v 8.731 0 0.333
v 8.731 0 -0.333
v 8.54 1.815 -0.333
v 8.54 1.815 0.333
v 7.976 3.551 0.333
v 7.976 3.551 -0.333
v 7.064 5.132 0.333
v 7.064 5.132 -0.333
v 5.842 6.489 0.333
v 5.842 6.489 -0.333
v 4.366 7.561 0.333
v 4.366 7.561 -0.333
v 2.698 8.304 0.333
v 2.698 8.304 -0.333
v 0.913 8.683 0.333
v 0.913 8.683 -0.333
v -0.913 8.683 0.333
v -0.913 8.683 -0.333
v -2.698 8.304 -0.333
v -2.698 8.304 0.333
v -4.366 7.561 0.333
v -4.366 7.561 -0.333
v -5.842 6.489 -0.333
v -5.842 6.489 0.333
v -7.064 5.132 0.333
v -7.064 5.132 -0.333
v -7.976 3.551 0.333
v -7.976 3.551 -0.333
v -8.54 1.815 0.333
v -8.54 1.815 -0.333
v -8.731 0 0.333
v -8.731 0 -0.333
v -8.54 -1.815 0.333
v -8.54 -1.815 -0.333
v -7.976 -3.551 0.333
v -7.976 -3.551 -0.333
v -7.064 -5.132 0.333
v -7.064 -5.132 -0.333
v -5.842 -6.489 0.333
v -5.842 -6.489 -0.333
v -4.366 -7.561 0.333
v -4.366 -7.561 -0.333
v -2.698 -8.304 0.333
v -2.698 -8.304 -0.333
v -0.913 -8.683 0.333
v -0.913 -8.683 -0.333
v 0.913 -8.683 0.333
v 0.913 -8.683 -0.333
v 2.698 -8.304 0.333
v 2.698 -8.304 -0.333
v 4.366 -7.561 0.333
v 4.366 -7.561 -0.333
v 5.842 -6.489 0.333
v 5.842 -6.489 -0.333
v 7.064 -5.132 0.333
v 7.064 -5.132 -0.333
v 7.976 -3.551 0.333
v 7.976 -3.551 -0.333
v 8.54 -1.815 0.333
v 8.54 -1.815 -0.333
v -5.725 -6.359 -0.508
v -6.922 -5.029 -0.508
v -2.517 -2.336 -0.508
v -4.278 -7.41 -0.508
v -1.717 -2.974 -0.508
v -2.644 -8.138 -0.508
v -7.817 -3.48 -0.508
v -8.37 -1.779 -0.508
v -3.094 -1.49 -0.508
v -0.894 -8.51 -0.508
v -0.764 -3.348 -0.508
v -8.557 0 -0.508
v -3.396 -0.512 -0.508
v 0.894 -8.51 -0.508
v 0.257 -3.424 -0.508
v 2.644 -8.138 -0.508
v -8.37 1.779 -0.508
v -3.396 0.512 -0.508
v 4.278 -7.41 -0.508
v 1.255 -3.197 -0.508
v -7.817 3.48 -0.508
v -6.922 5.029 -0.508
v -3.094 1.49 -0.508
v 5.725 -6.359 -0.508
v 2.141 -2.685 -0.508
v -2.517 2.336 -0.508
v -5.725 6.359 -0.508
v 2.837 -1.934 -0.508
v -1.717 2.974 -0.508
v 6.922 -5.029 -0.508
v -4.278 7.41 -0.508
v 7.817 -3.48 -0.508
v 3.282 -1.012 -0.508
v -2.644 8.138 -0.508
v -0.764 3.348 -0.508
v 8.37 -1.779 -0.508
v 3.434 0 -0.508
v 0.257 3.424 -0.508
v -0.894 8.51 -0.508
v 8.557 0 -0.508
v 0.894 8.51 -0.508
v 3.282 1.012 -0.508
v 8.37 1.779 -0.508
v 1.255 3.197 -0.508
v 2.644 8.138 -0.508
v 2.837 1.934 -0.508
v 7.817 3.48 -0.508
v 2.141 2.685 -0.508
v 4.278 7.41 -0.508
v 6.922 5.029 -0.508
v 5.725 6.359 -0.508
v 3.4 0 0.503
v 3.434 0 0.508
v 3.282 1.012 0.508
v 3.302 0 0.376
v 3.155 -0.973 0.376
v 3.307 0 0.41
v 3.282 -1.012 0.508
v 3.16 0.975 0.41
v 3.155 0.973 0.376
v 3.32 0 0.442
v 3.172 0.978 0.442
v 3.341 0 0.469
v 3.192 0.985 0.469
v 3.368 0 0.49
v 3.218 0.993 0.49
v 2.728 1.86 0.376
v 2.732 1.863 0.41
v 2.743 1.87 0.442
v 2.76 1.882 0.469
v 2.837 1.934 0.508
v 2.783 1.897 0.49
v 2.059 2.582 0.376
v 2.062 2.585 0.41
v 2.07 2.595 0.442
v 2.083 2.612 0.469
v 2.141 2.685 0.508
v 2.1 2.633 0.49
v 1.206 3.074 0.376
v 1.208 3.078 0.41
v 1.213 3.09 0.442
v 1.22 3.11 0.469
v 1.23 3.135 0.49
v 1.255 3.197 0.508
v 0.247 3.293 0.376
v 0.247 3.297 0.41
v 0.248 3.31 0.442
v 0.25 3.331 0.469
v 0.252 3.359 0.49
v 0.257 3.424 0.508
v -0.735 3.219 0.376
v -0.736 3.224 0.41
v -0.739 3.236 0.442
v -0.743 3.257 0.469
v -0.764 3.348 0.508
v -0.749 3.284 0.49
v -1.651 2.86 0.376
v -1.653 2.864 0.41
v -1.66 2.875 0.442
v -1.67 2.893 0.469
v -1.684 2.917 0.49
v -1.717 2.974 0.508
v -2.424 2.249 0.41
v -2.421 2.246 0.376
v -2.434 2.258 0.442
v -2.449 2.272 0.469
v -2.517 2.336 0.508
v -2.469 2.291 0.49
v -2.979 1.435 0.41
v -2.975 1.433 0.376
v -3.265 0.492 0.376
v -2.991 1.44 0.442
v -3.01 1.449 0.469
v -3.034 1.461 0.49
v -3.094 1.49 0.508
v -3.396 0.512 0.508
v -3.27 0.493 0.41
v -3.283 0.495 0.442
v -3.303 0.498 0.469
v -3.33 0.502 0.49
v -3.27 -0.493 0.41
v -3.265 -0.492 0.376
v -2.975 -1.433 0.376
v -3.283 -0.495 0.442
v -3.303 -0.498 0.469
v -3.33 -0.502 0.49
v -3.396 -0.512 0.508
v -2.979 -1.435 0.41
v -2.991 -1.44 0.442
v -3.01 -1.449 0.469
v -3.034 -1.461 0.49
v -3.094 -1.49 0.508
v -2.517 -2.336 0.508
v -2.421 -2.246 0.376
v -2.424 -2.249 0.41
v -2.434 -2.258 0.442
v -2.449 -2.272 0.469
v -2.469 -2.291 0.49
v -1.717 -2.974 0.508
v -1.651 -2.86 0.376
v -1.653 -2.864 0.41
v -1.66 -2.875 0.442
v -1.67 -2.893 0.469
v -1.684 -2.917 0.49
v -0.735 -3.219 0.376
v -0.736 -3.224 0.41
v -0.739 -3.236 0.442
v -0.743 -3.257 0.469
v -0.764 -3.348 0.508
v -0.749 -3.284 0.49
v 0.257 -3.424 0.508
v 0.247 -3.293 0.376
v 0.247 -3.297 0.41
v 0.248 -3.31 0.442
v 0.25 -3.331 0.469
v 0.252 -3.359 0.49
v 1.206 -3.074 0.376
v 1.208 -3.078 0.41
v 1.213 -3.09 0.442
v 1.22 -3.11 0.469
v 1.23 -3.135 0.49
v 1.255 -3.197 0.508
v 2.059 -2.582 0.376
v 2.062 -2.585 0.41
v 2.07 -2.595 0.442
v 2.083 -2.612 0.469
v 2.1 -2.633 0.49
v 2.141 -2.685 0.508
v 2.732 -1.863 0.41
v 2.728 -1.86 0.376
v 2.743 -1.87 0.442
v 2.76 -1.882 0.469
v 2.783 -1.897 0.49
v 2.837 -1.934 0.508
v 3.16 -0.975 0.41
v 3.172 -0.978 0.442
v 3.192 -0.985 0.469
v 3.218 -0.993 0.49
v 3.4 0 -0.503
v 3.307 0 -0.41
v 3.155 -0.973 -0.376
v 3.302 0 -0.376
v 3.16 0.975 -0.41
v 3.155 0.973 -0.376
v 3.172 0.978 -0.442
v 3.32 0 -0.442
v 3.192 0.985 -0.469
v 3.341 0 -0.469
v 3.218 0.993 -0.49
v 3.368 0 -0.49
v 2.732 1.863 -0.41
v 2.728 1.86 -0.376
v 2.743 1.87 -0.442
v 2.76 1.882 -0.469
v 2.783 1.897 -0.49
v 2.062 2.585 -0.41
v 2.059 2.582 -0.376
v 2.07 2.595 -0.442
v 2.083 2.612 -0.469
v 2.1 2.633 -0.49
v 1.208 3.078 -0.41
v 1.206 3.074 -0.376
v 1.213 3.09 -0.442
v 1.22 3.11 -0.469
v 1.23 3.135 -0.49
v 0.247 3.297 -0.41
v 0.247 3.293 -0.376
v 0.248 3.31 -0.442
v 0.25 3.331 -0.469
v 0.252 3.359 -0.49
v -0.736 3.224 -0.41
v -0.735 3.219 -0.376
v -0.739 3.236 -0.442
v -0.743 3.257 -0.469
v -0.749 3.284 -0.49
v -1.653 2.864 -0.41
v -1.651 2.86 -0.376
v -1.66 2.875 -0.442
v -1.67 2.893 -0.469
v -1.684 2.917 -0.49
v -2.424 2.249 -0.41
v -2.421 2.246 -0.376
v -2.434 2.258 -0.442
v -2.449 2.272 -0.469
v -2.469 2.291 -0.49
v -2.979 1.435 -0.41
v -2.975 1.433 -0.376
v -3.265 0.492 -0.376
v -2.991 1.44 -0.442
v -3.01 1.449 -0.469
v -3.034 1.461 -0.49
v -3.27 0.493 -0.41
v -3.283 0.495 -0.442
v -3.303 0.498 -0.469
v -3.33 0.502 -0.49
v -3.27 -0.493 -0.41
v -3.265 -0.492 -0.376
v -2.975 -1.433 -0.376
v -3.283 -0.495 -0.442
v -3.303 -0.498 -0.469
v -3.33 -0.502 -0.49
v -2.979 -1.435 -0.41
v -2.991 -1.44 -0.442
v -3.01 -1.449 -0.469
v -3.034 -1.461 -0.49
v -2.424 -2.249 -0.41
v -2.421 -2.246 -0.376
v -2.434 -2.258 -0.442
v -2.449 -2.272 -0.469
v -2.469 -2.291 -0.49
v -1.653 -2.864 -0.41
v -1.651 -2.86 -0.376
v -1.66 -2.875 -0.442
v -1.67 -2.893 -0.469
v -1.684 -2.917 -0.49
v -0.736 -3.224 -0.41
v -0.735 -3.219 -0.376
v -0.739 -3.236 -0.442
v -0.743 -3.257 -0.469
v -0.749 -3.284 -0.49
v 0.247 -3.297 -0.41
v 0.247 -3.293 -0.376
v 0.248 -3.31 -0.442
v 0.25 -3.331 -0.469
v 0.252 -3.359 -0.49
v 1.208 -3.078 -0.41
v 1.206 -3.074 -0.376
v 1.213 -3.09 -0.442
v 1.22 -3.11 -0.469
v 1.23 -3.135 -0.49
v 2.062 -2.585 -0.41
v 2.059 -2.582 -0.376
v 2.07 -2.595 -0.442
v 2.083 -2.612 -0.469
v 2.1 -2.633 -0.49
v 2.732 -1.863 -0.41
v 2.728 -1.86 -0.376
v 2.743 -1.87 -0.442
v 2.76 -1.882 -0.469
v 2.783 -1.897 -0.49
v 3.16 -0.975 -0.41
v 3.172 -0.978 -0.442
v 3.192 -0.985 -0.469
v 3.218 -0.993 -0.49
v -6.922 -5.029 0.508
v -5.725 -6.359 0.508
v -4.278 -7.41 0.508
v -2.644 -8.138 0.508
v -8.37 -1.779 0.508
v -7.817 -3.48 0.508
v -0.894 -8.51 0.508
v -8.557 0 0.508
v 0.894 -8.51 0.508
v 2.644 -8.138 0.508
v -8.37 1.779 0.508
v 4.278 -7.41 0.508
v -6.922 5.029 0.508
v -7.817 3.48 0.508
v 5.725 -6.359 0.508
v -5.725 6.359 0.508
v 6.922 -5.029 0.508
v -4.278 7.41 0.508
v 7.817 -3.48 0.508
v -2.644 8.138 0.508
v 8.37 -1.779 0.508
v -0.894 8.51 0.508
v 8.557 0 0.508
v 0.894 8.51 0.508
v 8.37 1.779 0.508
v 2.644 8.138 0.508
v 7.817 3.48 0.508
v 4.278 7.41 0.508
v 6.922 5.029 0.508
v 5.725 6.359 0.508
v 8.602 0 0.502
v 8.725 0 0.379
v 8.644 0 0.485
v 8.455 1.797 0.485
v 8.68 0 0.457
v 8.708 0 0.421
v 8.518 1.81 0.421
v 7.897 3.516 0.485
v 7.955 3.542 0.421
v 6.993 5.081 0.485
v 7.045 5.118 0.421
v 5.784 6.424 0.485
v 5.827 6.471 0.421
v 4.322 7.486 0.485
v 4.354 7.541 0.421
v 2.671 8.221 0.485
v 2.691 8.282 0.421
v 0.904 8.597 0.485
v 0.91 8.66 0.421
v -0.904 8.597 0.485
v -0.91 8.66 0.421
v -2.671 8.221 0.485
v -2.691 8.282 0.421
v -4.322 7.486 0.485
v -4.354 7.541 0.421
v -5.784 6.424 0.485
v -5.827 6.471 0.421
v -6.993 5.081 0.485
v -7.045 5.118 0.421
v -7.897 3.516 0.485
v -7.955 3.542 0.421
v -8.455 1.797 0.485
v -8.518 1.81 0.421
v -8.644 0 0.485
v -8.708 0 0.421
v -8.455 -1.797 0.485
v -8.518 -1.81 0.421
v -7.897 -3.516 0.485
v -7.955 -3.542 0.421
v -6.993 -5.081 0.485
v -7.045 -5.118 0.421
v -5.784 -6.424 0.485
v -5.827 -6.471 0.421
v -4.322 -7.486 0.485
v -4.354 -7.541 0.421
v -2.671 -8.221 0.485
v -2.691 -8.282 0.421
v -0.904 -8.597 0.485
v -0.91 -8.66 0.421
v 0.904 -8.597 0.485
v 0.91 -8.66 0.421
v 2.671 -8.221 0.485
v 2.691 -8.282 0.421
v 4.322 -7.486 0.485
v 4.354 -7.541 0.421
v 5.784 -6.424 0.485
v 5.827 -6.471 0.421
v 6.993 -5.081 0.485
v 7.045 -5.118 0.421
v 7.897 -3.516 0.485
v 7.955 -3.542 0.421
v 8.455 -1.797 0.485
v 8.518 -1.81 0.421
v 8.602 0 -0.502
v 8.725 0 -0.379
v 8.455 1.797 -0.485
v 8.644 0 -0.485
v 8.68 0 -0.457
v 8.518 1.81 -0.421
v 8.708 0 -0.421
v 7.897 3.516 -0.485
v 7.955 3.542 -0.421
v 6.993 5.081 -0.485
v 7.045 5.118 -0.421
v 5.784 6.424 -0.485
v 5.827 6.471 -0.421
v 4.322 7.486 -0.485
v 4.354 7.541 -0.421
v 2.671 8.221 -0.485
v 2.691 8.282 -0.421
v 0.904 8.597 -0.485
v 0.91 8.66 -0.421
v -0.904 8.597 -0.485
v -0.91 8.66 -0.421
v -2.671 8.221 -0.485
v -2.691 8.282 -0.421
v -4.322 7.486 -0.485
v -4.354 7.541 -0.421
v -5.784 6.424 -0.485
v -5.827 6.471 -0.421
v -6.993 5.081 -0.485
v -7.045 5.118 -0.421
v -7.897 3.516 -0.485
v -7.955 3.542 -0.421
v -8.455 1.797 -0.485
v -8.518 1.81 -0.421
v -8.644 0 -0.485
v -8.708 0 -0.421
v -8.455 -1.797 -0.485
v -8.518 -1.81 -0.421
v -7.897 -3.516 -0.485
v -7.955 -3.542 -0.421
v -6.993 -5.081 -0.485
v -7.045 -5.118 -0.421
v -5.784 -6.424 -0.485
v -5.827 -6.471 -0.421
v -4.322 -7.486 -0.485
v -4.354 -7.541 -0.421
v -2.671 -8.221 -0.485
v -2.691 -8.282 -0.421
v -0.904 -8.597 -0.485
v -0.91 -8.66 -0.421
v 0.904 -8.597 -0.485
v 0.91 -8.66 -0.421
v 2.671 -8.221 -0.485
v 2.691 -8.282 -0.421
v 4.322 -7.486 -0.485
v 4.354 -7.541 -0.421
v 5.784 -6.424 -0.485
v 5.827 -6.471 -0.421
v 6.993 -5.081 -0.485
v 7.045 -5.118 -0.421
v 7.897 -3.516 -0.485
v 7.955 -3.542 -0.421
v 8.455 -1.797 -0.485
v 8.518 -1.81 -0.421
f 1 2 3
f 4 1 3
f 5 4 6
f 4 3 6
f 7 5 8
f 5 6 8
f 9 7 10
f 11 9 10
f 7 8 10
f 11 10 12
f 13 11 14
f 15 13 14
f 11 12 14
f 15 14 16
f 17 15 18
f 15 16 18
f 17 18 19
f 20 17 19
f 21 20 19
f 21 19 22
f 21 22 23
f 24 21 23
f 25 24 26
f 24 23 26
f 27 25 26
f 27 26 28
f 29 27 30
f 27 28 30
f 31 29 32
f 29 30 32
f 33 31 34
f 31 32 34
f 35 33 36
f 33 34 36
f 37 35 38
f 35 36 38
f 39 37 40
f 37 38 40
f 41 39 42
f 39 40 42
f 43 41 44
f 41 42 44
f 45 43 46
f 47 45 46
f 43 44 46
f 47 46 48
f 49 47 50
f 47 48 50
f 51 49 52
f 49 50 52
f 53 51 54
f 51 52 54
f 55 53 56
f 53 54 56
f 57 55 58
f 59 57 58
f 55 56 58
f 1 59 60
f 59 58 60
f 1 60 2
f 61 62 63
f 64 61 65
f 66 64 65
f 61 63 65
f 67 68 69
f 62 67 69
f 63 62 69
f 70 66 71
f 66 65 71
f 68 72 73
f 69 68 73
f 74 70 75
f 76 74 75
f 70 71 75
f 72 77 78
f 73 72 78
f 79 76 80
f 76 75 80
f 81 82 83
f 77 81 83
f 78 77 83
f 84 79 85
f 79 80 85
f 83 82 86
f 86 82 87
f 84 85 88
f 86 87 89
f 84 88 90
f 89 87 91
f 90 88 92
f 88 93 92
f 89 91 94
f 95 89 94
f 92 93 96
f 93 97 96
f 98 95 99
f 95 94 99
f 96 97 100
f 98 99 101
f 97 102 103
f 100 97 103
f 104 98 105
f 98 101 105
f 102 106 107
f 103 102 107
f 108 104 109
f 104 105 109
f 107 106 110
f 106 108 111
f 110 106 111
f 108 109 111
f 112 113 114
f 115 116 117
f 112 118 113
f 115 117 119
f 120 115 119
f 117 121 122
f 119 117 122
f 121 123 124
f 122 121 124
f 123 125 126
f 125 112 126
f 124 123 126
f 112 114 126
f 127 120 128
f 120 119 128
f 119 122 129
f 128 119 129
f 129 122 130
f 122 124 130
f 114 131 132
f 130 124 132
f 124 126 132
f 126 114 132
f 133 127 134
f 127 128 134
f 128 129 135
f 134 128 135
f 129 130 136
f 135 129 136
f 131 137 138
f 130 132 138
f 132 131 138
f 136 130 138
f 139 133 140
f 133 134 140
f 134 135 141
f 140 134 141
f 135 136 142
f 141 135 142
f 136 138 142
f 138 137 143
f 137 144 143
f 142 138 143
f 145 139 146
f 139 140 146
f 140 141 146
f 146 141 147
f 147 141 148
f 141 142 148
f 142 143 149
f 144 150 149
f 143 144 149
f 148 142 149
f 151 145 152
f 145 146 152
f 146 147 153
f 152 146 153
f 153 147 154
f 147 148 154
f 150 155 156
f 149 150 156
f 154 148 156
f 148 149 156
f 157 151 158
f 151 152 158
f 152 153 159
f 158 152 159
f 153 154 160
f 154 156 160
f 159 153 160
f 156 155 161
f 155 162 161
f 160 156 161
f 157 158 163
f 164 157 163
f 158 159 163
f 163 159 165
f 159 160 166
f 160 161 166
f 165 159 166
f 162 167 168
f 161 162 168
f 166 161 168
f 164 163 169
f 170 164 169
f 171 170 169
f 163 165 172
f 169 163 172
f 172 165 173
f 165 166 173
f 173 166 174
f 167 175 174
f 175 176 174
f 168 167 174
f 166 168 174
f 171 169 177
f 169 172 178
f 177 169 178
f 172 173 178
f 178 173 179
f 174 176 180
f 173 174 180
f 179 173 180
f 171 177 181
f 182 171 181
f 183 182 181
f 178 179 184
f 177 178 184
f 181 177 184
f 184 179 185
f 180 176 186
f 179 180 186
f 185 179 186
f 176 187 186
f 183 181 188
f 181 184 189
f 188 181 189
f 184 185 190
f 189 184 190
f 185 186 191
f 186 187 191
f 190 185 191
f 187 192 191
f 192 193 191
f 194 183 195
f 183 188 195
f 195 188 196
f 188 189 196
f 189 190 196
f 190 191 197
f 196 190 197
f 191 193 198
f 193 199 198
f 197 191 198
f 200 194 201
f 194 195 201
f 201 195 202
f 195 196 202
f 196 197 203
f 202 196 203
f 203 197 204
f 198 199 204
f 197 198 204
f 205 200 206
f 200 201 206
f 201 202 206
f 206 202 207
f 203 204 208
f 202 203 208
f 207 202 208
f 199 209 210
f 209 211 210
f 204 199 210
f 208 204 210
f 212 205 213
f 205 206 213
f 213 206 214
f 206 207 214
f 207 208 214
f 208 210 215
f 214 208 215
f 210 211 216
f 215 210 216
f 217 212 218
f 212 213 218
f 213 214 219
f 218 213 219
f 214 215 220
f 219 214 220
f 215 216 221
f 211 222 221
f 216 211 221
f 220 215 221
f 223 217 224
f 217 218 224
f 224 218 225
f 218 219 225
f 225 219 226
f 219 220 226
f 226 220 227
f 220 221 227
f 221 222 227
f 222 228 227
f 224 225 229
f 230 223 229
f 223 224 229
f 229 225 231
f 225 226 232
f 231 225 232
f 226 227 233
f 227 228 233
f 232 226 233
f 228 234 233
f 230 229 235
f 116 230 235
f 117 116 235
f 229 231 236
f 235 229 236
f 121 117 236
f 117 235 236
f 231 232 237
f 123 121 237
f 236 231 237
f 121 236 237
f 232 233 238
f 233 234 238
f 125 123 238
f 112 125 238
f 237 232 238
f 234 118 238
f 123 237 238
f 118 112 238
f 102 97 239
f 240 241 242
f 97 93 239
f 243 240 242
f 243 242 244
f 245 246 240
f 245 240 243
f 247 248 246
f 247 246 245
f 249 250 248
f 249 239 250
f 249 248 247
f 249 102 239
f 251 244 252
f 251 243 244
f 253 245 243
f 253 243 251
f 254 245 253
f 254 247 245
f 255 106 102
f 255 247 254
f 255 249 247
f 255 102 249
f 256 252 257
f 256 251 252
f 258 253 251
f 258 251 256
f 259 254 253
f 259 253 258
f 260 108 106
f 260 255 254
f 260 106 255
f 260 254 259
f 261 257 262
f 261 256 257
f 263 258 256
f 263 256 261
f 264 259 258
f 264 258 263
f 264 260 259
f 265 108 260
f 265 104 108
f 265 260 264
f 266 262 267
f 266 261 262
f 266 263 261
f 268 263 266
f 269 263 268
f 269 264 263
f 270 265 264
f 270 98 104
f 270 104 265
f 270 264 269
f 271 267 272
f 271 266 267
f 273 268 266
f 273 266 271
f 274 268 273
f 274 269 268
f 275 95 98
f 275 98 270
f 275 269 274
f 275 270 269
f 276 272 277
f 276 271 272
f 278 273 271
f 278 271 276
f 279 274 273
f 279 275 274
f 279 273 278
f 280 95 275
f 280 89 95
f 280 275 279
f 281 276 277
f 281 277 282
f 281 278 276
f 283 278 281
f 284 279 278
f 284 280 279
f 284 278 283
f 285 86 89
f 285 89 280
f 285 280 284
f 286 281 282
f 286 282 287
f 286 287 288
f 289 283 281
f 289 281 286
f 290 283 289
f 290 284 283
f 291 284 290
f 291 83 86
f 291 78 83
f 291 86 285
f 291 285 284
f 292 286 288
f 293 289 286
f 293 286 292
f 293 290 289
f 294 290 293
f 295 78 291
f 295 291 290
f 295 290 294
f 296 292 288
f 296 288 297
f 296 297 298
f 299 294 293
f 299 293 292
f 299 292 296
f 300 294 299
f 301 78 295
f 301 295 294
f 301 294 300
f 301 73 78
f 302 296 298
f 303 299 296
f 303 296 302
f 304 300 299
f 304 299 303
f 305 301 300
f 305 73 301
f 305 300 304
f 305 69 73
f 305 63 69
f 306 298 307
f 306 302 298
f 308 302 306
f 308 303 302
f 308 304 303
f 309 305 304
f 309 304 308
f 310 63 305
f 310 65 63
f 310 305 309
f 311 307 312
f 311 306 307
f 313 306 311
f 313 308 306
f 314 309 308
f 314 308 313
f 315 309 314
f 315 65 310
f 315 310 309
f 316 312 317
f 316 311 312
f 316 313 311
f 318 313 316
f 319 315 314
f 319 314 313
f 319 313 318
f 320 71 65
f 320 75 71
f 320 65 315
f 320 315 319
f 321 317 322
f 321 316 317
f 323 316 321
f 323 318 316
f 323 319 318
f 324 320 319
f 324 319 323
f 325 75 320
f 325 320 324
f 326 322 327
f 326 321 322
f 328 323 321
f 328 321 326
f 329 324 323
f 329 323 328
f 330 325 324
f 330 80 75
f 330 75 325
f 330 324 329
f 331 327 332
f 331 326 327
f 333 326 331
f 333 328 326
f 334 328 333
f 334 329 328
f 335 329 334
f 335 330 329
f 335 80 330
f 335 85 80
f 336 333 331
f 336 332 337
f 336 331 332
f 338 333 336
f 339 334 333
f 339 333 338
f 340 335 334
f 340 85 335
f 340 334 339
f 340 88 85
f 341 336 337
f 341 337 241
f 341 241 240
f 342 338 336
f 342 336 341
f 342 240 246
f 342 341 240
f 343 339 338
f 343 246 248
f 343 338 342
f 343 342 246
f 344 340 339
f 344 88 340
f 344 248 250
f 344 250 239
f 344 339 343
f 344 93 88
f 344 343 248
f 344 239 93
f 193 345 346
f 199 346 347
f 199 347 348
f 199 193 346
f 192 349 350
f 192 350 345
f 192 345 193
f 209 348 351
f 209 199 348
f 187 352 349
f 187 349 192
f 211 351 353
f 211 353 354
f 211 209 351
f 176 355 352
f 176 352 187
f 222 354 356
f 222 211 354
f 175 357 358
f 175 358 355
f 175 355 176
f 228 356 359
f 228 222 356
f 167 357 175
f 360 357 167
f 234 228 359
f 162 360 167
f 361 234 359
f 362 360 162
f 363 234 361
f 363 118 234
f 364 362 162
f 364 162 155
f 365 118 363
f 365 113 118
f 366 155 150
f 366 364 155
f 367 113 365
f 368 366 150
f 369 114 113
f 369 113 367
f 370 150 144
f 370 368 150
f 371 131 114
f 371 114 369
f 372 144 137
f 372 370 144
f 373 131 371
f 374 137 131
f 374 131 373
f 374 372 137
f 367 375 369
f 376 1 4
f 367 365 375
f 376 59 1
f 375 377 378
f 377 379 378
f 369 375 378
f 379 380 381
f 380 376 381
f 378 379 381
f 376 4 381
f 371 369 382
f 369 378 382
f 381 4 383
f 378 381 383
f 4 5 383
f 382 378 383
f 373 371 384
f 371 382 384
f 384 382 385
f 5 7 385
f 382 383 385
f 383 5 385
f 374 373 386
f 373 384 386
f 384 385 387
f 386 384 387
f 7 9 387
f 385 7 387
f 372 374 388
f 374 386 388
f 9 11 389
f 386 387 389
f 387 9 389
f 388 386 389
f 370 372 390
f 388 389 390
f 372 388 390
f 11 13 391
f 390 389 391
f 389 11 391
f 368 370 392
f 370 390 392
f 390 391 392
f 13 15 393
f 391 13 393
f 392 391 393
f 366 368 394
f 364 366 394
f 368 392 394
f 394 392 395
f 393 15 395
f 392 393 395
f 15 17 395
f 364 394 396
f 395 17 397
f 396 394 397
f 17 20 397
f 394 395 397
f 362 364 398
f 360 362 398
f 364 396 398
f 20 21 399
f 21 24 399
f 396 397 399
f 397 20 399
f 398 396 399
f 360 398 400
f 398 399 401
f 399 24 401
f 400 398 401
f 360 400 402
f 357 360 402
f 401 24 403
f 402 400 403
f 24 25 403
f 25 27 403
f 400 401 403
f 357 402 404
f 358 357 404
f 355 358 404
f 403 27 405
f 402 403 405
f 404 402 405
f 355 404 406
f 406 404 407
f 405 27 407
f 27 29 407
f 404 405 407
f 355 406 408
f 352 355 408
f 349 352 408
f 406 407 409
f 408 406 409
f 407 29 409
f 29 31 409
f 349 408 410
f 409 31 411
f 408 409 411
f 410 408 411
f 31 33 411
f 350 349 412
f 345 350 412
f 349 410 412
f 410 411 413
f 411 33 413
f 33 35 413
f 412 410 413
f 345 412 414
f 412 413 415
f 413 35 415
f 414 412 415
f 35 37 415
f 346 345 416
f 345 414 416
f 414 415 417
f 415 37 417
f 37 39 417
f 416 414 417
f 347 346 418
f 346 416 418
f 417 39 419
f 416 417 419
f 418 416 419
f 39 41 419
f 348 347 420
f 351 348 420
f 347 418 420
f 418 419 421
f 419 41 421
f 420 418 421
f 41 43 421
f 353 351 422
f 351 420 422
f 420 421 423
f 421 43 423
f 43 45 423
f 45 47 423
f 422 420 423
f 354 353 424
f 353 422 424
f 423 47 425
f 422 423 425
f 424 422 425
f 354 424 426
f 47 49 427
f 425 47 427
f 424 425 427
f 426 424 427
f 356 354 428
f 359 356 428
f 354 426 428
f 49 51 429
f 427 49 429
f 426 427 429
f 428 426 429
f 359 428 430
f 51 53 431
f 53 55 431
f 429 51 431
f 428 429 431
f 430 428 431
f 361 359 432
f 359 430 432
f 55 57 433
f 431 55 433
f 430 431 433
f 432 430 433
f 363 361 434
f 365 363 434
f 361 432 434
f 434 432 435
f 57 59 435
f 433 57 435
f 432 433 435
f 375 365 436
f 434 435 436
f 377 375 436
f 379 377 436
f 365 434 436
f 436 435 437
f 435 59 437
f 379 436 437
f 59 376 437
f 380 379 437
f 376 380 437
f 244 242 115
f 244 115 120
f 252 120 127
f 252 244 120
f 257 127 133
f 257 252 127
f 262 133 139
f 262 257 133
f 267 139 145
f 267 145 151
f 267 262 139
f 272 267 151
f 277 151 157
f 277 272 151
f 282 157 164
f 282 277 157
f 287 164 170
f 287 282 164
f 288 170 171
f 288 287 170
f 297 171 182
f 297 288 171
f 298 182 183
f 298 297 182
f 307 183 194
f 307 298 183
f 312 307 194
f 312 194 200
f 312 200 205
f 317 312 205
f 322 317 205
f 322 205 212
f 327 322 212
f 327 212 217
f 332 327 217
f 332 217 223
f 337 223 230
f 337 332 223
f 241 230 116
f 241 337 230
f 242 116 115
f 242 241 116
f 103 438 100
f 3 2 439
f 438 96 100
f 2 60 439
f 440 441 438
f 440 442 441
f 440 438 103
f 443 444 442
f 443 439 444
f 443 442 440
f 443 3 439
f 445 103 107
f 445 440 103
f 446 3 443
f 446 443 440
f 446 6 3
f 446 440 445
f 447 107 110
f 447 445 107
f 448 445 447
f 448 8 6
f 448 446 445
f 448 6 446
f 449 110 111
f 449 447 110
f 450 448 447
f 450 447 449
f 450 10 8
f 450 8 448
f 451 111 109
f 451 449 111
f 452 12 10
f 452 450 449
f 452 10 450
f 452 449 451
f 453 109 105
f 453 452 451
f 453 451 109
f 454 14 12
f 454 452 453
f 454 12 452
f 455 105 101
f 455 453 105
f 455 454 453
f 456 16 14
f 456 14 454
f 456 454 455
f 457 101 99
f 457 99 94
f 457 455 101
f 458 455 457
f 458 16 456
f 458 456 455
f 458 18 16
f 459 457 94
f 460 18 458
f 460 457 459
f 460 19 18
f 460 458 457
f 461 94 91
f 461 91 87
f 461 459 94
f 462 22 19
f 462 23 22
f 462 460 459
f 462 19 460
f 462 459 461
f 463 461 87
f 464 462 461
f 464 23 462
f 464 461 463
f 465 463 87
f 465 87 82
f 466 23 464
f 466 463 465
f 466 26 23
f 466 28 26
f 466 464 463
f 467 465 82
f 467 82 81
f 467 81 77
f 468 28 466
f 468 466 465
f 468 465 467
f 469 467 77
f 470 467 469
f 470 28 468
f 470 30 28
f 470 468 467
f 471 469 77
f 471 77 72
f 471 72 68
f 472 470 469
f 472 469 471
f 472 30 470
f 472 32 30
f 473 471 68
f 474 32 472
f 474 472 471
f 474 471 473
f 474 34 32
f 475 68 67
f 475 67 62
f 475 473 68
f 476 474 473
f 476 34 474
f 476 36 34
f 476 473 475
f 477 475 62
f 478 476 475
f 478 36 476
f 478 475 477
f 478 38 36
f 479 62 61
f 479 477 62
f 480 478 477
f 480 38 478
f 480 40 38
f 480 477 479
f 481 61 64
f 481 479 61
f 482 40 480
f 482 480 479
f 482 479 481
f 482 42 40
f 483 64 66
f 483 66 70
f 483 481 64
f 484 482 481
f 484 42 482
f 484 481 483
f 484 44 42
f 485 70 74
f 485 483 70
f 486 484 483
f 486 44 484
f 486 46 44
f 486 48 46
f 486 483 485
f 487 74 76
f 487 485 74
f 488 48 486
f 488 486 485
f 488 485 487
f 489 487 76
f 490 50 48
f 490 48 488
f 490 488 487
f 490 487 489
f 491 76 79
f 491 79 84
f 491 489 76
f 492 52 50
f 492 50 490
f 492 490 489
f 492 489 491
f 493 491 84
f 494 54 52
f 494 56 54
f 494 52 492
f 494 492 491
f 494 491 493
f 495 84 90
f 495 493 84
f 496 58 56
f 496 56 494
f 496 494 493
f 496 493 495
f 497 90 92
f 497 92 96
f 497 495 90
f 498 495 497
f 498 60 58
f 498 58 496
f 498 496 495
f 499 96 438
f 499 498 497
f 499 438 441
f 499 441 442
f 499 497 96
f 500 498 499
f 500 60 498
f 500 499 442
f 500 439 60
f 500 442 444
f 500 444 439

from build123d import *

# Parameters (mm, degrees)
BOSS_EXTRUDE1_DEPTH      = 0.508
BOSS_EXTRUDE1_DEPTH_BACK = 0.508
SKETCH3_R                = 8.73125
SKETCH3_R_2              = 3.302
FILLET1_R                = 0.13208
FILLET2_R                = 0.174625


with BuildPart() as part:
    # Sketch3 → Boss-Extrude1 (new, two sides: drawn at the far end of the back side and taken through both)
    with BuildSketch(Plane.XY.offset(-BOSS_EXTRUDE1_DEPTH_BACK)):
        Circle(SKETCH3_R)
        Circle(SKETCH3_R_2, mode=Mode.SUBTRACT)
    extrude(amount=BOSS_EXTRUDE1_DEPTH + BOSS_EXTRUDE1_DEPTH_BACK)

    # Fillet1
    fillet1_edges = [part.edges().sort_by_distance(p)[0] for p in [
        (-3.302, 0, 0.508),
        (-3.302, 0, -0.508),
    ]]
    fillet(fillet1_edges, radius=FILLET1_R)

    # Fillet2
    fillet2_edges = [part.edges().sort_by_distance(p)[0] for p in [
        (-8.73125, 0, 0.508),
        (-8.73125, 0, -0.508),
    ]]
    fillet(fillet2_edges, radius=FILLET2_R)


solid = part.part
